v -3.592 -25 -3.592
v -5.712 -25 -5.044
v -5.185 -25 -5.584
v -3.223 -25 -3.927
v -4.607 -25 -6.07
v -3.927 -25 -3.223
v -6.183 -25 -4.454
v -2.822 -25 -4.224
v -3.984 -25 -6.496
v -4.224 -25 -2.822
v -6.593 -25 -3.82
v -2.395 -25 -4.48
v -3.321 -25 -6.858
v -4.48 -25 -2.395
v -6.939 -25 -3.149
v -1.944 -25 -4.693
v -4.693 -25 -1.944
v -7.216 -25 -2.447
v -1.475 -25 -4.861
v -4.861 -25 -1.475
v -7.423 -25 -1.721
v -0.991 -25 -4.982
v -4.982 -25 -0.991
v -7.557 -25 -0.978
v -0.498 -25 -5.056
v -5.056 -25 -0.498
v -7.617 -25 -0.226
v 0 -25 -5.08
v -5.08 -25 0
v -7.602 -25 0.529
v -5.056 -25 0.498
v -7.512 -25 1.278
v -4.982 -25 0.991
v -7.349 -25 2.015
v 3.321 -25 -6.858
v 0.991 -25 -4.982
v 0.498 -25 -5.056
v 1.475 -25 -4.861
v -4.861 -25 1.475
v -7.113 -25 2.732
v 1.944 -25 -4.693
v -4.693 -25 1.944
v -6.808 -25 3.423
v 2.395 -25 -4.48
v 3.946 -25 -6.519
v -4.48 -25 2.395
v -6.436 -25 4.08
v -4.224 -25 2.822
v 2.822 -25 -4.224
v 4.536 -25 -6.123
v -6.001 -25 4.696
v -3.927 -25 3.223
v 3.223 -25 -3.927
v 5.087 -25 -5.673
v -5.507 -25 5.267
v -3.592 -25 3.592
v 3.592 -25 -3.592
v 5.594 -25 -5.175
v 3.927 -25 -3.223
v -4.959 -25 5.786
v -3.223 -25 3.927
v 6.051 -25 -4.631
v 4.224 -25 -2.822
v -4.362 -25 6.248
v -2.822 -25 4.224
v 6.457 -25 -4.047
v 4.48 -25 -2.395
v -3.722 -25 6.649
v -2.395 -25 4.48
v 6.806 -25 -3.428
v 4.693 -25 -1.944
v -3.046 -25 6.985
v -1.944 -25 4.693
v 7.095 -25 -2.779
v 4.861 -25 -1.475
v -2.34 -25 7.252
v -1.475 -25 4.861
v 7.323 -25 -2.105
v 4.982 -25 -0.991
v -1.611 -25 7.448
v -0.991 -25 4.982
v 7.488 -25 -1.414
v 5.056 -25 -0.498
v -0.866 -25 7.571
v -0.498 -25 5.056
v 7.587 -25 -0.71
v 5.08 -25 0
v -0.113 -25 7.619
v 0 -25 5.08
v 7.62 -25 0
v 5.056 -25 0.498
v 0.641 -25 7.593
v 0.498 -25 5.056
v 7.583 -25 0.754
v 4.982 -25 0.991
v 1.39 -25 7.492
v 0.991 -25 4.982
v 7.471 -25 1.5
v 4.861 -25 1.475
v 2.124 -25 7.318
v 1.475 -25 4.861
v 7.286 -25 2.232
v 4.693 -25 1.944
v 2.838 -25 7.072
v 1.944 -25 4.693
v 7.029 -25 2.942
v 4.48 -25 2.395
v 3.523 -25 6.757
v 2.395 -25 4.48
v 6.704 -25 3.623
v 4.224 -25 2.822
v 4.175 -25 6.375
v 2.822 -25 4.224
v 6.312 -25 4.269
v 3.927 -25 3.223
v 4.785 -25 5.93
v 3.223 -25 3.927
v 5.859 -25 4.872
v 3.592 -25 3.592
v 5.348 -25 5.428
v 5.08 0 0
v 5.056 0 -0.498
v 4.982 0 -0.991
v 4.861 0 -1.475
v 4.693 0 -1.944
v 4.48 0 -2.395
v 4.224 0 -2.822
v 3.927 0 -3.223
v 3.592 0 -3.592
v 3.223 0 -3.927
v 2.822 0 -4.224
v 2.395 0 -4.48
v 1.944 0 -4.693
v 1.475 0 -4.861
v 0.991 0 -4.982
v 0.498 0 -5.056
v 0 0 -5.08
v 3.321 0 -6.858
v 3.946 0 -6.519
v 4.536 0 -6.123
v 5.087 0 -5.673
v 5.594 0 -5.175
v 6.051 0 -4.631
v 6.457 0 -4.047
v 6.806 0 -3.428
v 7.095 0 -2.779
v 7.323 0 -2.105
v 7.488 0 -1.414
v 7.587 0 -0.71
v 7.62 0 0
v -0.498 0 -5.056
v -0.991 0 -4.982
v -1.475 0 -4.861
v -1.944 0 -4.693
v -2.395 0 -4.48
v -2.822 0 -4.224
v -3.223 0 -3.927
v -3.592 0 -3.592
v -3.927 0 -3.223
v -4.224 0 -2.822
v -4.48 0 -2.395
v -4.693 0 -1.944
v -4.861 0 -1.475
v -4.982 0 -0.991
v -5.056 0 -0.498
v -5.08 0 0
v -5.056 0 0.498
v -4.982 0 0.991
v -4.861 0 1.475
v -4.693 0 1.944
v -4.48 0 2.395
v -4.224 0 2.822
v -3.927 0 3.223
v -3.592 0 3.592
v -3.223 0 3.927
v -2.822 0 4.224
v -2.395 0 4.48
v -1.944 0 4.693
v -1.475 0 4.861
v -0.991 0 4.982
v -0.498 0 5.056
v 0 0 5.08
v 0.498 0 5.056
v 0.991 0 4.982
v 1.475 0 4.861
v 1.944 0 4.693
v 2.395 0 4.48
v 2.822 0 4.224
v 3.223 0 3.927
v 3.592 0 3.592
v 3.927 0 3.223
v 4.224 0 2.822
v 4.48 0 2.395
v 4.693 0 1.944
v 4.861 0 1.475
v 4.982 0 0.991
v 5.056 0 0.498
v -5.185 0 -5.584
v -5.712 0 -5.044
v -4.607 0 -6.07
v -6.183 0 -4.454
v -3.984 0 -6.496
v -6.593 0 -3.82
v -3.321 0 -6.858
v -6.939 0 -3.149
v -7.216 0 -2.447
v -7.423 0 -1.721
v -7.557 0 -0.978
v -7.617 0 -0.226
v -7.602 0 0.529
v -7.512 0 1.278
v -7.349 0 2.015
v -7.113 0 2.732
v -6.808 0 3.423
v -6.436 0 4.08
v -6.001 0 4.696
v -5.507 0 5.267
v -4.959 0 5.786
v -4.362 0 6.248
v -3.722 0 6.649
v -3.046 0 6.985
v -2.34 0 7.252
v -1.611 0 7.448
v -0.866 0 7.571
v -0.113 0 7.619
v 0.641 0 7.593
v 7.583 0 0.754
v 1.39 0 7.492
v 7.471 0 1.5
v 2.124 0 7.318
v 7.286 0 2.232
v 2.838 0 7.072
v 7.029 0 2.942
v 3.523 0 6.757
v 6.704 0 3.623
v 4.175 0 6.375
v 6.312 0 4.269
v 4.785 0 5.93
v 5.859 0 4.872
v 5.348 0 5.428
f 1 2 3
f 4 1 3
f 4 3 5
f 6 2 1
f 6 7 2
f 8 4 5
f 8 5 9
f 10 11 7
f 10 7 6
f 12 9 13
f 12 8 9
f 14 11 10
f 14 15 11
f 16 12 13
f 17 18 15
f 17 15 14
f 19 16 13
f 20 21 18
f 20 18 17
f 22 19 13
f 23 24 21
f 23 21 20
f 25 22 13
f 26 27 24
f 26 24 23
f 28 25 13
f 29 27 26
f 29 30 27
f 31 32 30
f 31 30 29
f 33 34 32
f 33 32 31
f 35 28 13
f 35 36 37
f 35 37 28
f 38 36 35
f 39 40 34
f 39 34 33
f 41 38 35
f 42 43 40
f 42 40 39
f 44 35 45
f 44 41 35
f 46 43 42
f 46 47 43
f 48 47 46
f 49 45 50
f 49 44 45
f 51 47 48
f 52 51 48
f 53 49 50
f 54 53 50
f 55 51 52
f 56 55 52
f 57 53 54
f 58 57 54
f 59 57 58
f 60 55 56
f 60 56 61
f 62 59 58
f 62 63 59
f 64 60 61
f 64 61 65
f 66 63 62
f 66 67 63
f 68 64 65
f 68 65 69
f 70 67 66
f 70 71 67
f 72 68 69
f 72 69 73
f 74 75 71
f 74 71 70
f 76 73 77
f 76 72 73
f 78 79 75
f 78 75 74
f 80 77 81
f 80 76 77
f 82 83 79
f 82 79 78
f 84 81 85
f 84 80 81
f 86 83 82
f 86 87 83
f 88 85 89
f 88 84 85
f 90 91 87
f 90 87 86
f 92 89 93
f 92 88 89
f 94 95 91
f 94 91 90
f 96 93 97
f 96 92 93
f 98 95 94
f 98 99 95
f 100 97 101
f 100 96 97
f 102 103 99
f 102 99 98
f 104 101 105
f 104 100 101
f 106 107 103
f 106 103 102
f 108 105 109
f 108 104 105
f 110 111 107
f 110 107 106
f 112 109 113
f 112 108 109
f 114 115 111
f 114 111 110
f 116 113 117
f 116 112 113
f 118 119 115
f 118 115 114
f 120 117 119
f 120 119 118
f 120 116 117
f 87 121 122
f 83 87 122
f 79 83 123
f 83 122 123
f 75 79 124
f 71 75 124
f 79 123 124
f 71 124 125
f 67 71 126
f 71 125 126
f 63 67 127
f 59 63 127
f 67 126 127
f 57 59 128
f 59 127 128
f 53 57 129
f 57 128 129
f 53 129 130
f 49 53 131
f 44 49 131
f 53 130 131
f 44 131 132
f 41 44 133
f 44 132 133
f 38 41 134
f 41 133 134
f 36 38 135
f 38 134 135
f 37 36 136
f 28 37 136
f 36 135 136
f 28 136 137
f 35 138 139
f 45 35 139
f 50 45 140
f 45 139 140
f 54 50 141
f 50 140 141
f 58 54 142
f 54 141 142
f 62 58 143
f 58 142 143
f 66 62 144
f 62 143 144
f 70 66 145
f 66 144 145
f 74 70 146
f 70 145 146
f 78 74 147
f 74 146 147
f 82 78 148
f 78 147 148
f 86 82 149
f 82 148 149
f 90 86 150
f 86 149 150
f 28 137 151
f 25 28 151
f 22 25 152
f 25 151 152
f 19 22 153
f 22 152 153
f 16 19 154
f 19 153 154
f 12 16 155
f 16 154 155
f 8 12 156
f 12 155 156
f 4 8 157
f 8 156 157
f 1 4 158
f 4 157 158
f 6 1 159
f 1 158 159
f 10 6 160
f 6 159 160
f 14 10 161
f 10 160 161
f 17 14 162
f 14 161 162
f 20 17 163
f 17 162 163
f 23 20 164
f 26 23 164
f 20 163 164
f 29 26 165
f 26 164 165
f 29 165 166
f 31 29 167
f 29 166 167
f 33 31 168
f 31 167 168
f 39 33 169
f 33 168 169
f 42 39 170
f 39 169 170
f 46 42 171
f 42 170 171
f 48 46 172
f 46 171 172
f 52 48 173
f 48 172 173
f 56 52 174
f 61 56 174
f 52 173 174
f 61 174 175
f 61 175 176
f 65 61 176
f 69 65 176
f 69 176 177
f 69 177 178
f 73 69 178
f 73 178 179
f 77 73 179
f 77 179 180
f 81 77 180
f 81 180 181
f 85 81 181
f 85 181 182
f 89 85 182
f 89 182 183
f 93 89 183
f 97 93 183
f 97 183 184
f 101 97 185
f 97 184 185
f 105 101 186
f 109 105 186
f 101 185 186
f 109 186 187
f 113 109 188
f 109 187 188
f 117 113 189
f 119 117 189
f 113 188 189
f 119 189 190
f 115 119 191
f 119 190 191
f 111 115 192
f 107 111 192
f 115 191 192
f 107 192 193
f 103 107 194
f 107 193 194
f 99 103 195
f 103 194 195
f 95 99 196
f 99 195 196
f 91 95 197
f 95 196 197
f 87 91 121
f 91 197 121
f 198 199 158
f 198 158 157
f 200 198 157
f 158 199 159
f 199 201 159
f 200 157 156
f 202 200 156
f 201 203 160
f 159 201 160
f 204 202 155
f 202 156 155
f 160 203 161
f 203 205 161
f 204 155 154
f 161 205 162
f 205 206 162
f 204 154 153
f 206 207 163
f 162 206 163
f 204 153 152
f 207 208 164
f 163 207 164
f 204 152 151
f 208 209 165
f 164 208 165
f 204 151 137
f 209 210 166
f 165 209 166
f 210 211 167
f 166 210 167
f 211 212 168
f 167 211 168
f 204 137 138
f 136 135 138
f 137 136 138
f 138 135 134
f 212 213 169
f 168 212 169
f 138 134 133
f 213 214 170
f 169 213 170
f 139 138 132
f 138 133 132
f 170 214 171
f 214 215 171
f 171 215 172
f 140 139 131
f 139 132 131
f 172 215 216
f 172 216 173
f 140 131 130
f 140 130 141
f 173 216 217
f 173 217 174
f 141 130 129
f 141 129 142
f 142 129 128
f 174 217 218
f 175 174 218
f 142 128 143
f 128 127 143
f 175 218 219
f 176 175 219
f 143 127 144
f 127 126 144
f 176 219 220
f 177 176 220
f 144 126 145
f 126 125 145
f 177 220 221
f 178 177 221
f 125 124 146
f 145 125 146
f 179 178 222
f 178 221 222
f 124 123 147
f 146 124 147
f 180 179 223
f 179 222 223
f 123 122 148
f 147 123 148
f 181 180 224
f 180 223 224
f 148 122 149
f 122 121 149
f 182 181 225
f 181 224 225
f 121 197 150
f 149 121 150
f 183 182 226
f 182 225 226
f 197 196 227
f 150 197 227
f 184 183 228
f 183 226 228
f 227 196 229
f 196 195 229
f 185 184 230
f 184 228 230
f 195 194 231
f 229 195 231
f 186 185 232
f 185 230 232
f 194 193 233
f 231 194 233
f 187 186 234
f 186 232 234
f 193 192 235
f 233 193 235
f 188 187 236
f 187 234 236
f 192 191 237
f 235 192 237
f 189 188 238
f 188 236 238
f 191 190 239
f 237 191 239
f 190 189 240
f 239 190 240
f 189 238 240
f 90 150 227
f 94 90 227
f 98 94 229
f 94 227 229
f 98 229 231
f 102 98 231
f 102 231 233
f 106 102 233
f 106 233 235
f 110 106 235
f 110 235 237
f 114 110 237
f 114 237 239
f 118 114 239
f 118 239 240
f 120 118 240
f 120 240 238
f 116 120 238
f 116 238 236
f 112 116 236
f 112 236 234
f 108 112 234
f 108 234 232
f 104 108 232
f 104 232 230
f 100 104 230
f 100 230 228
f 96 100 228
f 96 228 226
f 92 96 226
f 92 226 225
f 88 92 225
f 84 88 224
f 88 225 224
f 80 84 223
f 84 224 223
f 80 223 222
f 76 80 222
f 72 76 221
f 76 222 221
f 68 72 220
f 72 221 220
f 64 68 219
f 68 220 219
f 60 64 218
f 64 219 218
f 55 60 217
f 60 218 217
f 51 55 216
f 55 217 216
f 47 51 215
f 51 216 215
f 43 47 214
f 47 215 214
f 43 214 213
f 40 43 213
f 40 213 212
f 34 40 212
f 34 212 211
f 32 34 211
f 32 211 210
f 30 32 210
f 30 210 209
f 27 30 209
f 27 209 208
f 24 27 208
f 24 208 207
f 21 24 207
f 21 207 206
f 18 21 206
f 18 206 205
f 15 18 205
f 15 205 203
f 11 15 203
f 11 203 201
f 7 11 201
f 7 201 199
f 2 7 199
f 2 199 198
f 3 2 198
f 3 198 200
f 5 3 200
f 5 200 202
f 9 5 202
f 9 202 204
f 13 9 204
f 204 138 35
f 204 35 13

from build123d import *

# Parameters (mm, degrees)
F1_DEPTH = 25
F2_W     = 7.634899
F2_H     = 3.302
F2_W_2   = 7.225763
F3_DEPTH = 181.102


with BuildPart() as f1:
    # F0 (on Front) → F1 (new body)
    with BuildSketch(Plane.XZ):
        with BuildLine():
            ThreePointArc((7.62, 0), (-5.388154, 5.388154), (0, -7.62))
            ThreePointArc((0, -7.62), (5.388154, -5.388154), (7.62, 0))
        make_face()
        with BuildLine():
            ThreePointArc((0, -5.08), (-3.592102, 3.592102), (5.08, 0))
            ThreePointArc((5.08, 0), (3.592102, -3.592102), (0, -5.08))
        make_face(mode=Mode.SUBTRACT)
    extrude(amount=F1_DEPTH)

    # F2 (on Front) → F3 (cut)
    with BuildSketch(Plane.XZ):
        with Locations((3.817449, -8.509)):
            Rectangle(F2_W, F2_H)
        with Locations((-3.612881, -8.509)):
            Rectangle(F2_W_2, F2_H)
    extrude(amount=F3_DEPTH, mode=Mode.SUBTRACT)


solid = f1.part
